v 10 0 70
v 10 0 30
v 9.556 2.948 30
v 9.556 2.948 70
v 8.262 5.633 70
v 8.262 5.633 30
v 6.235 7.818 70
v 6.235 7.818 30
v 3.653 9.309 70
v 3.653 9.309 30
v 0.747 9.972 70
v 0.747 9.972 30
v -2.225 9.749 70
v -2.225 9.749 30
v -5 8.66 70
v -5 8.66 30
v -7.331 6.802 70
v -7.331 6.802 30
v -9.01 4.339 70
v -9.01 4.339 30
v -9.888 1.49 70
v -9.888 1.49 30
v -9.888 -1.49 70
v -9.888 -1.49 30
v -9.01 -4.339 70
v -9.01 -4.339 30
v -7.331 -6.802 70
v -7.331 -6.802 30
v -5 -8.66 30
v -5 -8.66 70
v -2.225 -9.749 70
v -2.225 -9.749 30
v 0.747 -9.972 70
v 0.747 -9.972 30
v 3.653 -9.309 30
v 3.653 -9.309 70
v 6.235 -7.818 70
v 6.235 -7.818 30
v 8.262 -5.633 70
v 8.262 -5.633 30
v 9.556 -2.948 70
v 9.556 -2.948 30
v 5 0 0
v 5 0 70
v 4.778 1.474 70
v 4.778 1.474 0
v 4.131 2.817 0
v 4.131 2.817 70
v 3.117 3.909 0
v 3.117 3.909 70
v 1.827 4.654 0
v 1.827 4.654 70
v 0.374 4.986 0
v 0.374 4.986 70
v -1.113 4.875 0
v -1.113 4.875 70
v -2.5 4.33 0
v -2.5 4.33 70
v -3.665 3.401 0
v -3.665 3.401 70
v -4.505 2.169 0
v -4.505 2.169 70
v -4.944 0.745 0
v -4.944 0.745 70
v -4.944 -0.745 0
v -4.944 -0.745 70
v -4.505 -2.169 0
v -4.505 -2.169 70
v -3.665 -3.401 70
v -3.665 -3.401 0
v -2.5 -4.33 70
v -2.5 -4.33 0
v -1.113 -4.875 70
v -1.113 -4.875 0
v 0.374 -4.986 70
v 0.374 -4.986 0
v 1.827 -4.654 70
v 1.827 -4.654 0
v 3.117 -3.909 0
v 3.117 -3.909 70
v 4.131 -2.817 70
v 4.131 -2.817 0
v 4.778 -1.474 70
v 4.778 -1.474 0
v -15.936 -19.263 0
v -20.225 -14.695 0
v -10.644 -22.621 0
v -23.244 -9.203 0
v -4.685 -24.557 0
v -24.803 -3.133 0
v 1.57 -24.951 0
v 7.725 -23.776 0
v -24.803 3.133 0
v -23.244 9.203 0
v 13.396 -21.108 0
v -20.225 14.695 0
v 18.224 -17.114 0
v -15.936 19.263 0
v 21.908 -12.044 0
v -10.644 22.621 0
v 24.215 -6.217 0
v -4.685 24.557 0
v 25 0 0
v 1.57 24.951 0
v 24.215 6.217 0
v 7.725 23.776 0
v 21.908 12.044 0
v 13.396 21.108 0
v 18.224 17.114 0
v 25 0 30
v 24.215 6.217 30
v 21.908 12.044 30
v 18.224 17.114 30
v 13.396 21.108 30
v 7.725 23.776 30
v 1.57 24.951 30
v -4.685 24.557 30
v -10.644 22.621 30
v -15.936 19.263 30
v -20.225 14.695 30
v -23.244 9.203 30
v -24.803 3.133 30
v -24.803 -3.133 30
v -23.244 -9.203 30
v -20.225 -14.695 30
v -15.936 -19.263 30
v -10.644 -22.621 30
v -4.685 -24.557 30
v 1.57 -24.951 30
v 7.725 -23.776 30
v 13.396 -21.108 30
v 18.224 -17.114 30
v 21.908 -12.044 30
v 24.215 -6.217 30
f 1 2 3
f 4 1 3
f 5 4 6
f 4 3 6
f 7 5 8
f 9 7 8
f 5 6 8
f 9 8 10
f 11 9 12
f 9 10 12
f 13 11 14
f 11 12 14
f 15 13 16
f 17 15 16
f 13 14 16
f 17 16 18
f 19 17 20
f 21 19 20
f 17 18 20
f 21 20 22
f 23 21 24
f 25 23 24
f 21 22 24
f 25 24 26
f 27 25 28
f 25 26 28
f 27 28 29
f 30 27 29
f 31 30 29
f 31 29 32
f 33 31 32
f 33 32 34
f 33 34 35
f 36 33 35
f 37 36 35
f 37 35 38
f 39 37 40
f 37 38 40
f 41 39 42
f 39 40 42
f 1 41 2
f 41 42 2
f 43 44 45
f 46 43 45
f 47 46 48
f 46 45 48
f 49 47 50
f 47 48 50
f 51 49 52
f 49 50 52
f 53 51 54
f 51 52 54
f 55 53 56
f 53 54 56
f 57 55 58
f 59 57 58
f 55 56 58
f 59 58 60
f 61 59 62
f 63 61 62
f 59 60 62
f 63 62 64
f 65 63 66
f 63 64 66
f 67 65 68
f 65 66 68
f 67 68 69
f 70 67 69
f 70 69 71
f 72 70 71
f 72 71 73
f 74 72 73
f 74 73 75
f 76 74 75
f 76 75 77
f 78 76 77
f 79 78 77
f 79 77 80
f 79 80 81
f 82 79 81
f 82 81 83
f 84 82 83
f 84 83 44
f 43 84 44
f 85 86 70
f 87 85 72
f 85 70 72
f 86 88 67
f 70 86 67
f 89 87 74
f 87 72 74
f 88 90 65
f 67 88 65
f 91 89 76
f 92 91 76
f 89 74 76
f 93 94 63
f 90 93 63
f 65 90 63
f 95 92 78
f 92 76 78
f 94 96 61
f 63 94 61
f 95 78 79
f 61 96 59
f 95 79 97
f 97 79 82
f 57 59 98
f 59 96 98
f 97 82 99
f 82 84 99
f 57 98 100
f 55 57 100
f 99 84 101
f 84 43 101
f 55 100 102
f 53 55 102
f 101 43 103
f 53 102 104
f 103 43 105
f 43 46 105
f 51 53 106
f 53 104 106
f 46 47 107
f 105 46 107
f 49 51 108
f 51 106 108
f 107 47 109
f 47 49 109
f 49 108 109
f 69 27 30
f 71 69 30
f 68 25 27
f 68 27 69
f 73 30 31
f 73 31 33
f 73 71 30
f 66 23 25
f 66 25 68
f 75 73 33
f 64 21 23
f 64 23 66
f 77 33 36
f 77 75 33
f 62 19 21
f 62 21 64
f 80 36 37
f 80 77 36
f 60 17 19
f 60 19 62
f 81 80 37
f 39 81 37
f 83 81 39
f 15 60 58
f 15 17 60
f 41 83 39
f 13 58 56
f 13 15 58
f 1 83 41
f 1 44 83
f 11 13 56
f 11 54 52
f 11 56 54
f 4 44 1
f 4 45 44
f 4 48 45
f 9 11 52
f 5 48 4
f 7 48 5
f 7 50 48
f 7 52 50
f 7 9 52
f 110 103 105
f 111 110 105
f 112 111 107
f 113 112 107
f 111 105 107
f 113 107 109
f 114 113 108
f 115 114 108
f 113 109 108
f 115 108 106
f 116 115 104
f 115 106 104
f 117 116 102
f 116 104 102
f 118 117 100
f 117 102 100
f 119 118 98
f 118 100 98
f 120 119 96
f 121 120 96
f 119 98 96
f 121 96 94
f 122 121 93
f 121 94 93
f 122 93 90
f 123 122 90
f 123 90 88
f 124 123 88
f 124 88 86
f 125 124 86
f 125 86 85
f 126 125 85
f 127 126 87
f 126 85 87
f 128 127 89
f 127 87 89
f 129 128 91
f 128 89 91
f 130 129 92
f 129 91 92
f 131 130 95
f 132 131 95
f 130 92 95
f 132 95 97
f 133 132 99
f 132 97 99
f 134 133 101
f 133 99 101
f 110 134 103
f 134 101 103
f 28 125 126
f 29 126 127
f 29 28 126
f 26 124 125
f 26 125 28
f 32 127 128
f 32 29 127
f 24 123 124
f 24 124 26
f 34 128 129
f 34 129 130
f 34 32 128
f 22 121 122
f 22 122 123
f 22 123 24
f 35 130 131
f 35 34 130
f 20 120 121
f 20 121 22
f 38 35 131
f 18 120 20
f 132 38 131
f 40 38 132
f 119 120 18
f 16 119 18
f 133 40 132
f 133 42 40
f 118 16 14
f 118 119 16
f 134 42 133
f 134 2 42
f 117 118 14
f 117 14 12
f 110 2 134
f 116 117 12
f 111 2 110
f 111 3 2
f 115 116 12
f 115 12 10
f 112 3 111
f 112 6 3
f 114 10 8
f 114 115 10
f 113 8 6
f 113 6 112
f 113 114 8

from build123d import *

# Parameters (mm, degrees)
F0_R       = 25
F1_DEPTH   = 30
F2_R       = 10
F3_DEPTH   = 40
F4_R       = 5
F1_FACE1_R = 25
F5_DEPTH   = 70.001


with BuildPart() as f1:
    # F0 (on Top) → F1 (new body)
    with BuildSketch(Plane.XY):
        Circle(F0_R)
    extrude(amount=F1_DEPTH)

    # F2 (on face) → F3 (join)
    with BuildSketch(Plane.XY.offset(30)):
        Circle(F2_R)
    extrude(amount=F3_DEPTH)

    # F4 (on face) + F1_face1 (on face) → F5 (cut, through all)
    with BuildSketch(Plane.XY.offset(70)):
        Circle(F4_R)
    with BuildSketch(Plane(origin=(0, 0, 0), x_dir=(1, 0, 0), z_dir=(0, 0, -1))):
        Circle(F1_FACE1_R)
    extrude(amount=-F5_DEPTH, dir=(0, 0, 1), mode=Mode.SUBTRACT)


solid = f1.part
